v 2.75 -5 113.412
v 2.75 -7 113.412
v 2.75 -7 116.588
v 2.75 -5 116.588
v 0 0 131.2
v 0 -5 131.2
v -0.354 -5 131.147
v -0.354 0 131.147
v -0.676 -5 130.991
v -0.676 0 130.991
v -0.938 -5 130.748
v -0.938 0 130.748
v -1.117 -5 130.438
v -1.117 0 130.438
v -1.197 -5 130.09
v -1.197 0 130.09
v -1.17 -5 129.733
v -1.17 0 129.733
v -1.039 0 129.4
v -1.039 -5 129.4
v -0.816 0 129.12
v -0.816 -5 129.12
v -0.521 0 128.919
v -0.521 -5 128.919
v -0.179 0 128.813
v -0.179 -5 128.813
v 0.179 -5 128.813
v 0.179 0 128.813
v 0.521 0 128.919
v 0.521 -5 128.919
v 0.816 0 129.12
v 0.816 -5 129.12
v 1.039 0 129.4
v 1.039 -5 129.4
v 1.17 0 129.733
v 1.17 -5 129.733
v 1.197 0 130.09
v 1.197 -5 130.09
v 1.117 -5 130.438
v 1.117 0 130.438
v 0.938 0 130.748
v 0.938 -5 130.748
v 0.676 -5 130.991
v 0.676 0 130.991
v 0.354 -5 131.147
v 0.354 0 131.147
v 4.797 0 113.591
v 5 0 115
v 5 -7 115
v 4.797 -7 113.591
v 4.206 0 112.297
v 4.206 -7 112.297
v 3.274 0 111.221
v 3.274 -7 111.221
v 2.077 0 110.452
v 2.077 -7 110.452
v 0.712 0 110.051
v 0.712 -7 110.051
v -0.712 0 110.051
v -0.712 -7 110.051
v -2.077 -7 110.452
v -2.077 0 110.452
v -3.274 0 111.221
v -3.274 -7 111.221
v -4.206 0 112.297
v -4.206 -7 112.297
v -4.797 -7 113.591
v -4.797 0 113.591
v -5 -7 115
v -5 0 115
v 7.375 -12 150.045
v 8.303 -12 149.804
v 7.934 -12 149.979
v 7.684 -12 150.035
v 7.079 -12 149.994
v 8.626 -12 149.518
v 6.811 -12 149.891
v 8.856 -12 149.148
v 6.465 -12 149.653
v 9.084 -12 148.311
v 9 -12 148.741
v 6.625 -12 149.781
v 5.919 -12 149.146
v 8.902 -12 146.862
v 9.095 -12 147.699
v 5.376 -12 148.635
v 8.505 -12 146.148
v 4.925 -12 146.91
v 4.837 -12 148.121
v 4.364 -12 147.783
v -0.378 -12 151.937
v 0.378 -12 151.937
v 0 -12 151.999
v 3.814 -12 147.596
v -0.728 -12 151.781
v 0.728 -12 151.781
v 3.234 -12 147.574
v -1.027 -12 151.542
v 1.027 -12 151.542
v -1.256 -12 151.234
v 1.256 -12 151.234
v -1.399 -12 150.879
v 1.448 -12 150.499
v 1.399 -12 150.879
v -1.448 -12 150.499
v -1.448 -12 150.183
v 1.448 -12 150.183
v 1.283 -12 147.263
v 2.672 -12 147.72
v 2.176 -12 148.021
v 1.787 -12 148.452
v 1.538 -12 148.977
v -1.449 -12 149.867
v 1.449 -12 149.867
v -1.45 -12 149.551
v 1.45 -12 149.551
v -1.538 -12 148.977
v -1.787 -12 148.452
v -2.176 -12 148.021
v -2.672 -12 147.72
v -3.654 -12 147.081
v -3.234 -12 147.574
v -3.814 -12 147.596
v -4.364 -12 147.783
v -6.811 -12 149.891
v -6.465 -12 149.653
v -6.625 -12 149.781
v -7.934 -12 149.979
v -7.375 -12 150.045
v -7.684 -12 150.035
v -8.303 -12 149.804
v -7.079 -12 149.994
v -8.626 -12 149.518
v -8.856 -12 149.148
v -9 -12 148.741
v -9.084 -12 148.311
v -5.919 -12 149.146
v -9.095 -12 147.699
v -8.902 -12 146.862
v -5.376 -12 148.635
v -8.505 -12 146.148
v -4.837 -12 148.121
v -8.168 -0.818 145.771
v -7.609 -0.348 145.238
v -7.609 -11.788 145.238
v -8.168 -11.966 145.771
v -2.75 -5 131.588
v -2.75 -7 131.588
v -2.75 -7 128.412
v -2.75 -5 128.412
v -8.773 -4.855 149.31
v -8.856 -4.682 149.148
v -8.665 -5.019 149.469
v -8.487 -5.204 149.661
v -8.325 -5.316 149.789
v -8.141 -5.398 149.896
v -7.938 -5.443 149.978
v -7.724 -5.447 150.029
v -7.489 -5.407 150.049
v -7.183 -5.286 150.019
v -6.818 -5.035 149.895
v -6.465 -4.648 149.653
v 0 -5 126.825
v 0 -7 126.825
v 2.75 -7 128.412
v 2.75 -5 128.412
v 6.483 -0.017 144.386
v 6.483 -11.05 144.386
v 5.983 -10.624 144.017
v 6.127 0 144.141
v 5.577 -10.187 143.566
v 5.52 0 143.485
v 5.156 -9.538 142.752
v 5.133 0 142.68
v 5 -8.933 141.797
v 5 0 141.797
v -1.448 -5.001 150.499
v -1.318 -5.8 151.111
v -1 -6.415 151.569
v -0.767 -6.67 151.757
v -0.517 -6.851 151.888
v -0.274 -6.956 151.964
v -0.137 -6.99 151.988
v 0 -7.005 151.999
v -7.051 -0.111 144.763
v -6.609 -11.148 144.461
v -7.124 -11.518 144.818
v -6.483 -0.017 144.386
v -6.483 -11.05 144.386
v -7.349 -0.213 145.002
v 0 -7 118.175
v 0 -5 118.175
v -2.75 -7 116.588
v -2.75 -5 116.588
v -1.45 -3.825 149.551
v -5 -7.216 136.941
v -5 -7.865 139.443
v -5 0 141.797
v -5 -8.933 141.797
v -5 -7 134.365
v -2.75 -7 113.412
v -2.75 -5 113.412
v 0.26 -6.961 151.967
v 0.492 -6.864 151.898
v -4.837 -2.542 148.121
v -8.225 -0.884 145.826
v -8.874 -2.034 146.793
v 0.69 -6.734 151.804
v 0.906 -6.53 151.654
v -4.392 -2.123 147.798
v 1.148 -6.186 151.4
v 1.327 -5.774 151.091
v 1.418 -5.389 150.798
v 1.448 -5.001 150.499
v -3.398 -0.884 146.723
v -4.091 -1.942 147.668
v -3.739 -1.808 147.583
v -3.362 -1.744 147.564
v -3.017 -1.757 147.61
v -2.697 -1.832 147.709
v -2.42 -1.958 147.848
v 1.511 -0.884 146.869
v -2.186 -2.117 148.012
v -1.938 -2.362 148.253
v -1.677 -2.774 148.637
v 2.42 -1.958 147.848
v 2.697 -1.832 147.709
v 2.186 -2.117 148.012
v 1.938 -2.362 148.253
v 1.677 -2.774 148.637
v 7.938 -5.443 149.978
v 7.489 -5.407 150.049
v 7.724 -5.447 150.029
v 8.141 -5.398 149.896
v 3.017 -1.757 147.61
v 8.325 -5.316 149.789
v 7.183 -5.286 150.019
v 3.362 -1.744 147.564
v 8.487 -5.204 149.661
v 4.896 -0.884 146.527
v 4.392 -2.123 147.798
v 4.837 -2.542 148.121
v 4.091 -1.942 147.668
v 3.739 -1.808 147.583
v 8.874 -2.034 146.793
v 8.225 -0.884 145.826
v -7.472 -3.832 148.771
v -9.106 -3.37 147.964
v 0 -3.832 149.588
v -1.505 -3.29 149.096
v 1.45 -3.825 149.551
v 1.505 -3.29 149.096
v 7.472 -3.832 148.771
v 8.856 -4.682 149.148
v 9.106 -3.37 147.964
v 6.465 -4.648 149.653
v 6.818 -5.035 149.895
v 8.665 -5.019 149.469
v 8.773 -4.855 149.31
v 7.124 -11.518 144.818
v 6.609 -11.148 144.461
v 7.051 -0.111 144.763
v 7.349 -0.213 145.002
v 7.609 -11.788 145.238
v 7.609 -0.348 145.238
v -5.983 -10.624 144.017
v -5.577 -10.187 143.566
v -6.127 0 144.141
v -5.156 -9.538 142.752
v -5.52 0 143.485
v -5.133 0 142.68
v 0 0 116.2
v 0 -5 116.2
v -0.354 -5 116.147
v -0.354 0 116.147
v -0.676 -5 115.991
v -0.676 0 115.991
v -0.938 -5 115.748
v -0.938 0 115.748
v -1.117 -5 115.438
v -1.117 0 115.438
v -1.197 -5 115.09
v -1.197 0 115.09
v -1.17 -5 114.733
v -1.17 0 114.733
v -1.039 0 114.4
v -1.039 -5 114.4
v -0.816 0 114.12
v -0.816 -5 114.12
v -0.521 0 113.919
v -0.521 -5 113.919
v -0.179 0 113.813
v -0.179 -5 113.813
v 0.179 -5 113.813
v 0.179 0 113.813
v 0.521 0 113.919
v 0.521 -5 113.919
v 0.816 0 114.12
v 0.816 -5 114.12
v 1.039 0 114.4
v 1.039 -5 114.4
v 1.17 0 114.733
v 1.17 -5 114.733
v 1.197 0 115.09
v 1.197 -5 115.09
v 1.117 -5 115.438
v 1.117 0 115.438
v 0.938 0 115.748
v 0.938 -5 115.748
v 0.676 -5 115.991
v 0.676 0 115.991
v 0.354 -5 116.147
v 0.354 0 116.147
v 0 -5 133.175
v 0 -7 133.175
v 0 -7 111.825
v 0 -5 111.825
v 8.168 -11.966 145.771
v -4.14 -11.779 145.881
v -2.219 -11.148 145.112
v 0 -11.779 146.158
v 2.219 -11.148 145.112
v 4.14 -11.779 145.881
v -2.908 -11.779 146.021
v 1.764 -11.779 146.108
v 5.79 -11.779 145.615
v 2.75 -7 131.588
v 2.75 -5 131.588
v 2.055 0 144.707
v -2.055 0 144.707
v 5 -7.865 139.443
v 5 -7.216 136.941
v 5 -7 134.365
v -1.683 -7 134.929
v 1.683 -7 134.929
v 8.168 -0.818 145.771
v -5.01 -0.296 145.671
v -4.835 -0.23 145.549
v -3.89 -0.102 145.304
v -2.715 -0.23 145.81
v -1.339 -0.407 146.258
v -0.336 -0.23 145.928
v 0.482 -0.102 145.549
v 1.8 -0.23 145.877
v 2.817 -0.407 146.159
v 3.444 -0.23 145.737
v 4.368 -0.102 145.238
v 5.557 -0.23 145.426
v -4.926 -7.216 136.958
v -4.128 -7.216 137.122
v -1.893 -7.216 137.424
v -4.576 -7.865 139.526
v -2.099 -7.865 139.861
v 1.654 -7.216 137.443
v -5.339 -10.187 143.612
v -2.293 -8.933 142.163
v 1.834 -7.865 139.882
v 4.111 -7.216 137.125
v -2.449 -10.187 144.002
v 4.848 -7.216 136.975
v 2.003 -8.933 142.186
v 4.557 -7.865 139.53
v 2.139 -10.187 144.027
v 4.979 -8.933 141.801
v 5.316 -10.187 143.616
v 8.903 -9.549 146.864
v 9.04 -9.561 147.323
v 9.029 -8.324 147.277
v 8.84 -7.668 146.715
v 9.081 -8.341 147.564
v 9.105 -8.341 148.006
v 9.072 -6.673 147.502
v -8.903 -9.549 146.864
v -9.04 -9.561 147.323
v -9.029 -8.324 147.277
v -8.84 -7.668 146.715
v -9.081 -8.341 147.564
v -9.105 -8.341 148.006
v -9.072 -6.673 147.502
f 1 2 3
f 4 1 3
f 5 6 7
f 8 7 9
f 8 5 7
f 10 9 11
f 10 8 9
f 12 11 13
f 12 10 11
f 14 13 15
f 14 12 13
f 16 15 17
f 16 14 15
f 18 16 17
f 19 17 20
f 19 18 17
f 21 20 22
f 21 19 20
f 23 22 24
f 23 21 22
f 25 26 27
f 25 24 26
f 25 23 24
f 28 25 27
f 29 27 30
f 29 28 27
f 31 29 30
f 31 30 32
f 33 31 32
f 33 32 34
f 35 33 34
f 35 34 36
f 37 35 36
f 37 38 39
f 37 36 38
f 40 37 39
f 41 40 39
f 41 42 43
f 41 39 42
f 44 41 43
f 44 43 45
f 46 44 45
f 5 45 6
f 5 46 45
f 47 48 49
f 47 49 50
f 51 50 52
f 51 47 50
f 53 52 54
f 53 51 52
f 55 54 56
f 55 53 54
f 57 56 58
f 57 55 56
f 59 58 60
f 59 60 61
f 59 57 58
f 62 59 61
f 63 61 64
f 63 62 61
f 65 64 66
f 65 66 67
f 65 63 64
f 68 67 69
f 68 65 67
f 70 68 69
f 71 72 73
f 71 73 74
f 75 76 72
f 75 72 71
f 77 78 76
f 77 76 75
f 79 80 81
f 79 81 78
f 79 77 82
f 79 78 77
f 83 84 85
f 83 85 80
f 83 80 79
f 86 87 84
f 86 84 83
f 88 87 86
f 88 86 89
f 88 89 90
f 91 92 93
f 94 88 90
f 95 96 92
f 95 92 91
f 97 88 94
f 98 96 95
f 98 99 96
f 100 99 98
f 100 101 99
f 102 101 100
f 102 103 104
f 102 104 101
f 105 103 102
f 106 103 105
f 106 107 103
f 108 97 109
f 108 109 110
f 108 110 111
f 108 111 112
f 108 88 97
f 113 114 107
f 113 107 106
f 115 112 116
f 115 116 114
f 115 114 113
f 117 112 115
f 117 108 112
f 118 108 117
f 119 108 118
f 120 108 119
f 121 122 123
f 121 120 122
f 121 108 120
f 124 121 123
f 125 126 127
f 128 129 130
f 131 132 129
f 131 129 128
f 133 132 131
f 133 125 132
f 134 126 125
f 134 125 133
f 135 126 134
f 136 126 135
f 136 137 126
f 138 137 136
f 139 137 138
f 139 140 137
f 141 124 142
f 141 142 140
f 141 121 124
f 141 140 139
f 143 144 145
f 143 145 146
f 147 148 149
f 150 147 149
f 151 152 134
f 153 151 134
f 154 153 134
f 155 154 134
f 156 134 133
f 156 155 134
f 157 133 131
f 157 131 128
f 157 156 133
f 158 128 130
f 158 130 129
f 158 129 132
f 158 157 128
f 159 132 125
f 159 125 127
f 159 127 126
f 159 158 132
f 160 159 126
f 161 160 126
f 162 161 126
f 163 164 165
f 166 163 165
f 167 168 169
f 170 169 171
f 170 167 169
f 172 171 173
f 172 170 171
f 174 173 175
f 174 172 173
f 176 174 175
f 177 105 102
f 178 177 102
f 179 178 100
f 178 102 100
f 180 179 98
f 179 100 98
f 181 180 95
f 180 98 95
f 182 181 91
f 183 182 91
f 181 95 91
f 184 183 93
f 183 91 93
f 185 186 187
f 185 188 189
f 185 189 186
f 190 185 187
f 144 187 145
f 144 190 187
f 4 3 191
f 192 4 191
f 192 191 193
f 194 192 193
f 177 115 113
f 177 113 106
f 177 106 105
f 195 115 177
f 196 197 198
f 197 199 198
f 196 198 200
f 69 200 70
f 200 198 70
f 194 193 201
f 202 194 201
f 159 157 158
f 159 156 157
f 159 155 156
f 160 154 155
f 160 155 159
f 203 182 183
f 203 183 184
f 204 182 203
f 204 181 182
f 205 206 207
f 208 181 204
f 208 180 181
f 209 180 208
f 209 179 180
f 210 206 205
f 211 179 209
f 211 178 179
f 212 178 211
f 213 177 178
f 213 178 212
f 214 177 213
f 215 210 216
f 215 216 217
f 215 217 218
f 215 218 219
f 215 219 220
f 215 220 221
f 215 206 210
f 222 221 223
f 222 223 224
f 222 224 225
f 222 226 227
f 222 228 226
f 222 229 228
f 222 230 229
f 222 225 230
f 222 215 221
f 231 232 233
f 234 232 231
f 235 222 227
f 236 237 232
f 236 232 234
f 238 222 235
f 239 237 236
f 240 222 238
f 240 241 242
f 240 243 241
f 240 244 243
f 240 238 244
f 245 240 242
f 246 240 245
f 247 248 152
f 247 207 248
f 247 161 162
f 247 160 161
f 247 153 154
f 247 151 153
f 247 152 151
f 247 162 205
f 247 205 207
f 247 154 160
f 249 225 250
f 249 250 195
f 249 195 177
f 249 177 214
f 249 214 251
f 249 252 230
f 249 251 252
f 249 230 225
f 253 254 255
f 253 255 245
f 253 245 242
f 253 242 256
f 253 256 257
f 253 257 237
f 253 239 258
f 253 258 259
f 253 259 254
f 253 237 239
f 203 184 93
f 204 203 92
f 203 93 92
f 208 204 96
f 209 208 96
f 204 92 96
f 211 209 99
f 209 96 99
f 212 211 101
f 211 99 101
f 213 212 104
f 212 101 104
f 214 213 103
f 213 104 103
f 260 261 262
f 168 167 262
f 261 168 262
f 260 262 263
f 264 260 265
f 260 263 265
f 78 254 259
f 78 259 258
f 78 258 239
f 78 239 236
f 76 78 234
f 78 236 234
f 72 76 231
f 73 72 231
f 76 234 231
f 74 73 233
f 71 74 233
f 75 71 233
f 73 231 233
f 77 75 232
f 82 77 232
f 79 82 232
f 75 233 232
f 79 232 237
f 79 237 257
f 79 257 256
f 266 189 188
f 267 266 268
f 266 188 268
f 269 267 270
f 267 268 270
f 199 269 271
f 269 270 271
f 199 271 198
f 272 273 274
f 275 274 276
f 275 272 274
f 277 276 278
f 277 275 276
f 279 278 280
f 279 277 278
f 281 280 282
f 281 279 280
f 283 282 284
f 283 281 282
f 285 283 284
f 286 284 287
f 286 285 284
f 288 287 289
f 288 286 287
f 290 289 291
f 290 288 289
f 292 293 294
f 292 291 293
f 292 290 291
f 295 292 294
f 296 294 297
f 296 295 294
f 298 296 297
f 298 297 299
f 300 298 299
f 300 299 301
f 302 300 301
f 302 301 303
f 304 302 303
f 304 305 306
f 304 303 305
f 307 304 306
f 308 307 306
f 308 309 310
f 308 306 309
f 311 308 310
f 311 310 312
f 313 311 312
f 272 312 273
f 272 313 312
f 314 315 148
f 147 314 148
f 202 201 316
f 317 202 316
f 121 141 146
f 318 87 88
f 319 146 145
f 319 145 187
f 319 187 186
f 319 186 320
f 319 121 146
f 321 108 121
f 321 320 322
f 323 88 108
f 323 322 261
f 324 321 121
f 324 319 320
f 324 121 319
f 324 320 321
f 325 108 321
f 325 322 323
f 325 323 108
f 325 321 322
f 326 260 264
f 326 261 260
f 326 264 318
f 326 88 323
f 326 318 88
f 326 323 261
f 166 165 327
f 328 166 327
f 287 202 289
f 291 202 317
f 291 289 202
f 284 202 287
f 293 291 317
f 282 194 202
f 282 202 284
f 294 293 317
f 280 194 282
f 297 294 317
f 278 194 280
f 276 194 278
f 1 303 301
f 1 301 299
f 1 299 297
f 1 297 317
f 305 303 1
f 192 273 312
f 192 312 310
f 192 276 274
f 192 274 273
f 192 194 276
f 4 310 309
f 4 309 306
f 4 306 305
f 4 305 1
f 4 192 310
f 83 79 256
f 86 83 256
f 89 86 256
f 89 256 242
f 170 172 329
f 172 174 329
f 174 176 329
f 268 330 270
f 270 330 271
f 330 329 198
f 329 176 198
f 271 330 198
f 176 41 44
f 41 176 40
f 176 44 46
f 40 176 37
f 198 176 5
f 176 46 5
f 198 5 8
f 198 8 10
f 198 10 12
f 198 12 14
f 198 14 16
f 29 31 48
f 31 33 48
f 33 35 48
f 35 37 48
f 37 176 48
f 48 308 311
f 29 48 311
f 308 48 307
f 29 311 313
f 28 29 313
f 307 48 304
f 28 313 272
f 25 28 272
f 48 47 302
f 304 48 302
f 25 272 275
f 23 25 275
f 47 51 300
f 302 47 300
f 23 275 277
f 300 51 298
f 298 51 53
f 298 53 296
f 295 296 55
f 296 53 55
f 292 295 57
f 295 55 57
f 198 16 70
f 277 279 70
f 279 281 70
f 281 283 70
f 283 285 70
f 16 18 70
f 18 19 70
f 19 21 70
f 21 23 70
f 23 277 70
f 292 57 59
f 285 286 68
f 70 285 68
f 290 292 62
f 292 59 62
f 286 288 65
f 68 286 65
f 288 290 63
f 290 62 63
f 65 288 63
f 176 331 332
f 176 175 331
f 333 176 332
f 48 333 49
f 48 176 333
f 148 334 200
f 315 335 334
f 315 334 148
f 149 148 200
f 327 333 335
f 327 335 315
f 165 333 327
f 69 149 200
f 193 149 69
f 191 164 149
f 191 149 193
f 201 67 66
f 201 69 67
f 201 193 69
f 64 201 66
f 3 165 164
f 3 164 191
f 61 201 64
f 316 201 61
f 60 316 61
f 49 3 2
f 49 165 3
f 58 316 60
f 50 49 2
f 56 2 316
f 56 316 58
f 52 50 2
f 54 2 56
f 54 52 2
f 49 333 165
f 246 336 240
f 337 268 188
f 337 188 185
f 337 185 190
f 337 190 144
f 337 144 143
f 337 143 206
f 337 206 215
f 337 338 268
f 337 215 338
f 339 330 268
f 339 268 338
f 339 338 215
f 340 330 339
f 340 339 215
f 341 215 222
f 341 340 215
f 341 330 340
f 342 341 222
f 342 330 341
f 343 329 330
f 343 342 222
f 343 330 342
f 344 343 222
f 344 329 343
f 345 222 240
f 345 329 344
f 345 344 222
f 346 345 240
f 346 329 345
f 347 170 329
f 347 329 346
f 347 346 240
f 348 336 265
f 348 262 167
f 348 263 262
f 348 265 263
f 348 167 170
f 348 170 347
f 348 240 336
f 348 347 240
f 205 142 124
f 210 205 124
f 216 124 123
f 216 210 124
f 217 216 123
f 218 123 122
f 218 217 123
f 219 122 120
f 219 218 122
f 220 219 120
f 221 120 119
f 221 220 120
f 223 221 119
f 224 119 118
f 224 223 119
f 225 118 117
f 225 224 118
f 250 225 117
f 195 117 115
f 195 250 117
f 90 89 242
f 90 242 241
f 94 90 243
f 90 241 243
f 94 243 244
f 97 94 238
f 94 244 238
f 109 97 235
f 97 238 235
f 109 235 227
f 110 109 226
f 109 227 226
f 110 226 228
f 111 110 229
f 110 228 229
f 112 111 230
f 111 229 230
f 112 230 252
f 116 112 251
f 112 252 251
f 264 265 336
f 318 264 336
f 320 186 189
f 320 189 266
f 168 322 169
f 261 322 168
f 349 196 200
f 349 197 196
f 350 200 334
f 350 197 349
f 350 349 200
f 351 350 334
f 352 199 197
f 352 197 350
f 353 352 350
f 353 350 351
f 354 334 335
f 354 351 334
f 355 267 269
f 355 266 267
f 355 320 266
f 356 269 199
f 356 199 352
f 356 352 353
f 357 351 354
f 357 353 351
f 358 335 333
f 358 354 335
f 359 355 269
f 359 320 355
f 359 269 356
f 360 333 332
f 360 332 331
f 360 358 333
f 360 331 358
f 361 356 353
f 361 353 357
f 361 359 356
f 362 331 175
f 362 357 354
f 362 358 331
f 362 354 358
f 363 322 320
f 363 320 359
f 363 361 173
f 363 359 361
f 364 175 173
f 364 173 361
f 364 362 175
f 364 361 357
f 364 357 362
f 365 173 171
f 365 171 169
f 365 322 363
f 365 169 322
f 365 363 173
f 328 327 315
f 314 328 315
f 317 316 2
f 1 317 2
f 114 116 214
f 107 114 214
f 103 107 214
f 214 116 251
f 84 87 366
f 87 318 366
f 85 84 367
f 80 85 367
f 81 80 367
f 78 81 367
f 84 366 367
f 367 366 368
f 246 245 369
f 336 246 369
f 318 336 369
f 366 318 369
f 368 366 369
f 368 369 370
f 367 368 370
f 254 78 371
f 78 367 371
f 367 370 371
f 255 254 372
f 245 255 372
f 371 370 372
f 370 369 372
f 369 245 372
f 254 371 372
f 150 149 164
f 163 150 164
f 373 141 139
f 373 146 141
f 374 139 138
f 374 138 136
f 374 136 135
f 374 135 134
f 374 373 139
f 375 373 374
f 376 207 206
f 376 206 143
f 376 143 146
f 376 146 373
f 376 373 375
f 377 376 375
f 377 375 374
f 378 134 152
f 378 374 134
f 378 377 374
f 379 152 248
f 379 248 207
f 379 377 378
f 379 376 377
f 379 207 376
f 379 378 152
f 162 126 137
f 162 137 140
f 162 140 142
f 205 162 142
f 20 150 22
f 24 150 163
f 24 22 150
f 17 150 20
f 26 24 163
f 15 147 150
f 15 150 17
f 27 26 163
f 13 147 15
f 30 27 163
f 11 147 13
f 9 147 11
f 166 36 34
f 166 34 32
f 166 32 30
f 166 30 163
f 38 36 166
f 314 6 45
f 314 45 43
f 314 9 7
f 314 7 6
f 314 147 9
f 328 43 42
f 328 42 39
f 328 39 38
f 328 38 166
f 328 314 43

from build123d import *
from build123d.topology import SkipClean

# Parameters (mm, degrees)
ESQUISSE1_R             = 1.2
BOSS_EXTRU_1_DEPTH      = 12
BOSS_EXTRU_2_DEPTH      = 12
ESQUISSE3_OUTSIDE_W     = 37.484
ESQUISSE3_OUTSIDE_H     = 73.419
ENL_V_MAT_EXTRU_1_DEPTH = 170.970209289
CONG_2_R                = 3
CONG_1_R                = 1.5
ESQUISSE7_W             = 0.946782305
ESQUISSE7_H             = 12
ENL_V_MAT_EXTRU_5_DEPTH = 15
CONG_3_R                = 1.5
ENL_V_MAT_EXTRU_3_DEPTH = 2
CONG_4_R                = 3


with BuildPart() as part:
    # Esquisse1 → Boss.-Extru.1 (new body)
    with BuildSketch(Plane(origin=(0, 0, 0), x_dir=(1, 0, 0), z_dir=(0, 1, 0))):
        with BuildLine():
            Line((5, -115), (5, -146))
            Line((5, -146), (-5, -146))
            Line((-5, -146), (-5, -115))
            ThreePointArc((-5, -115), (0, -110), (5, -115))
        make_face()
        with Locations(Location((0, -115, 0), (0, 0, 270))):
            Circle(ESQUISSE1_R, mode=Mode.SUBTRACT)
        with Locations(Location((0, -130, 0), (0, 0, 270))):
            Circle(ESQUISSE1_R, mode=Mode.SUBTRACT)
    extrude(amount=-BOSS_EXTRU_1_DEPTH)

    # Esquisse2 → Boss.-Extru.2 (add)
    with BuildSketch(Plane(origin=(0, 0, 0), x_dir=(1, 0, 0), z_dir=(0, 1, 0))):
        with BuildLine():
            ThreePointArc((2.297654972, -159.197635973), (2.500096708, -154.365285132), (2.549630638, -149.52894936))
            ThreePointArc((2.549630638, -149.52894936), (-1.115535331, -144.03526605), (-7.609239761, -145.237680564))
            ThreePointArc((-7.609239761, -145.237680564), (-10.72587755, -148.106981091), (-13.96441251, -150.837953067))
            ThreePointArc((-13.96441251, -150.837953067), (-12.257608054, -167.514829553), (2.297654972, -159.197635973))
        make_face()
        with BuildLine():
            ThreePointArc((-11.452932946, -153.951226328), (-8.081311937, -151.108026363), (-4.836597406, -148.1208133))
            ThreePointArc((-4.836597406, -148.1208133), (-2.672029263, -147.720008461), (-1.450307273, -149.551236231))
            ThreePointArc((-1.450307273, -149.551236231), (-1.498545632, -154.261076504), (-1.695692457, -158.967036072))
            ThreePointArc((-1.695692457, -158.967036072), (-10.428850272, -163.95735222), (-11.452932946, -153.951226328))
        make_face(mode=Mode.SUBTRACT)
    extrude(amount=-BOSS_EXTRU_2_DEPTH)

    # Esquisse3 outside → Enlèv. mat.-Extru.1 (cut, through all)
    with BuildSketch(Plane(origin=(0, 0, 0), x_dir=(1, 0, 0), z_dir=(0, 1, 0))):
        with Locations((-6.343, -139.3105)):
            Rectangle(ESQUISSE3_OUTSIDE_W, ESQUISSE3_OUTSIDE_H)
        with BuildLine():
            Line((-13, -140.030172342), (-13, -110))
            Line((-13, -110), (0, -110))
            Line((0, -110), (0, -153.030172342))
            ThreePointArc((0, -153.030172342), (-9.192388155, -149.222560498), (-13, -140.030172342))
        make_face(mode=Mode.SUBTRACT)
    extrude(amount=-ENL_V_MAT_EXTRU_1_DEPTH, mode=Mode.SUBTRACT)

    # Congé2
    cong_2_edges = [part.edges().sort_by_distance(p)[0] for p in [
        (-5, -6, 143.765970759),
        (-10.40524253, -6, 147.823177404),
    ]]
    fillet(cong_2_edges, radius=CONG_2_R)

    # Congé1
    cong_1_edges = [part.edges().sort_by_distance(p)[0] for p in [
        (-7.535402248, -6, 150.623458563),
    ]]
    fillet(cong_1_edges, radius=CONG_1_R)

    # Esquisse5 → Enlèvement de matière-Révolution1 (revolve, cut)
    with BuildSketch(Plane(origin=(0, 0, 0), x_dir=(0, 0, -1), z_dir=(1, 0, 0))):
        with BuildLine():
            Line((-146, -12), (-115, -12))
            Line((-115, -12), (-115, -7))
            Line((-115, -7), (-135, -7))
            ThreePointArc((-135, -7), (-141.041522987, -8.308649429), (-146, -12))
        make_face()
        with BuildLine():
            Line((-146, 0), (-160, 0))
            Line((-160, 0), (-160, -32.619012861))
            ThreePointArc((-160, -32.619012861), (-156.352146256, -14.870773511), (-146, 0))
        make_face()
    revolve(axis=Axis((0, 0, 115), (0, -1, 0)), mode=Mode.SUBTRACT)

    # Symétrie1: part across plane


with BuildPart() as part_1:
    with SkipClean():  # the faces are left unmerged after this step: merging them gives an invalid solid
        add(part.part)
        add(part.part.mirror(Plane(origin=(0, 0, 0), x_dir=(0, 0, 1), z_dir=(1, 0, 0))))

    # Esquisse7 → Enlèv. mat.-Extru.5 (cut)
    with SkipClean():  # the faces are left unmerged after this step: merging them gives an invalid solid
        with BuildSketch(Plane(origin=(5, 0, 0), x_dir=(0, 0, -1), z_dir=(1, 0, 0))):
            with Locations((-152.473391152, -6)):
                Rectangle(ESQUISSE7_W, ESQUISSE7_H)
        extrude(amount=-ENL_V_MAT_EXTRU_5_DEPTH, mode=Mode.SUBTRACT)


with BuildPart() as enl_v_mat_extru_5_kept_piece:
    # of the separate pieces the step leaves, the one the design keeps (enl_v_mat_extru_5_pieces_kept)
    add(part_1.part.solids().sort_by_distance((0, 0, 146))[0])

    # Congé3
    # the kernel refuses this fillet: 1.5 mm, written as the material it takes off along each edge
    with BuildSketch(Plane(origin=(-1.456795034, -15.771881232, 152), x_dir=(0.005830598143572619, 0, -0.9999830019181767), z_dir=(0, 1, 0))) as cong_3_piece_1:
        with BuildLine():
            CenterArc((1.508771432, -1.49998095), CONG_3_R, 90.288765492, 90.045305066)
            Line((0.008796929, -1.508726847), (0, 0))
            ThreePointArc((0, 0), (0.750605801, -0.001891496), (1.501211601, 0))
        make_face()
    extrude(amount=12.495782984, mode=Mode.SUBTRACT)
    with BuildSketch(Plane(origin=(1.456795034, -15.771881232, 152), x_dir=(-1, 0, 0), z_dir=(0, 1, 0))) as cong_3_piece_2:
        with BuildLine():
            CenterArc((1.508752493, -1.5), CONG_3_R, 90, 90.045305066)
            ThreePointArc((0.008752962, -1.501186084), (0.006267945, -0.750582013), (0, 0))
            Line((0, 0), (1.508752493, 0))
        make_face()
    extrude(amount=12.495782984, mode=Mode.SUBTRACT)

    # Esquisse6 → Enlèv. mat.-Extru.3 (cut)
    with BuildSketch(Plane.XZ.offset(7)):
        Polygon((2.75, 116.58771324), (0, 118.175426481), (-2.75, 116.58771324), (-2.75, 113.41228676), (0, 111.824573519), (2.75, 113.41228676), align=None)
        Polygon((2.75, 131.58771324), (0, 133.175426481), (-2.75, 131.58771324), (-2.75, 128.41228676), (0, 126.824573519), (2.75, 128.41228676), align=None)
    extrude(amount=-ENL_V_MAT_EXTRU_3_DEPTH, mode=Mode.SUBTRACT)

    # Congé4
    cong_4_edges = [enl_v_mat_extru_5_kept_piece.edges().sort_by_distance(p)[0] for p in [
        (-3.75326222, -12, 145.771951883),
        (0, 0, 146),
    ]]
    fillet(cong_4_edges, radius=CONG_4_R)


solid = enl_v_mat_extru_5_kept_piece.part
